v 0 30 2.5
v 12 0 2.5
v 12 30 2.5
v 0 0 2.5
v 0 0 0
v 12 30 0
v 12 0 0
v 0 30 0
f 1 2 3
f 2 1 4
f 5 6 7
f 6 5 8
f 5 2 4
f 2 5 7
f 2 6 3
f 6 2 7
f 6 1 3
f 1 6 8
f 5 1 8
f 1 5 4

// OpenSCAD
// Plain number, no range
plain = 12;
// Max only
capped = 4; // [10]
// Step only range
stepped = 2.5; // [0:0.5:10]
// Min max
span = 30; // [10:60]
// Dropdown
choice = 2; // [1, 2, 3]
label = "hi";
flag = true;
vec = [1, 2, 3];
small = 0.4;
neg = -5;
zero = 0;
/* [Hidden] */
$fn = 48;
cube([plain, span, stepped]);
